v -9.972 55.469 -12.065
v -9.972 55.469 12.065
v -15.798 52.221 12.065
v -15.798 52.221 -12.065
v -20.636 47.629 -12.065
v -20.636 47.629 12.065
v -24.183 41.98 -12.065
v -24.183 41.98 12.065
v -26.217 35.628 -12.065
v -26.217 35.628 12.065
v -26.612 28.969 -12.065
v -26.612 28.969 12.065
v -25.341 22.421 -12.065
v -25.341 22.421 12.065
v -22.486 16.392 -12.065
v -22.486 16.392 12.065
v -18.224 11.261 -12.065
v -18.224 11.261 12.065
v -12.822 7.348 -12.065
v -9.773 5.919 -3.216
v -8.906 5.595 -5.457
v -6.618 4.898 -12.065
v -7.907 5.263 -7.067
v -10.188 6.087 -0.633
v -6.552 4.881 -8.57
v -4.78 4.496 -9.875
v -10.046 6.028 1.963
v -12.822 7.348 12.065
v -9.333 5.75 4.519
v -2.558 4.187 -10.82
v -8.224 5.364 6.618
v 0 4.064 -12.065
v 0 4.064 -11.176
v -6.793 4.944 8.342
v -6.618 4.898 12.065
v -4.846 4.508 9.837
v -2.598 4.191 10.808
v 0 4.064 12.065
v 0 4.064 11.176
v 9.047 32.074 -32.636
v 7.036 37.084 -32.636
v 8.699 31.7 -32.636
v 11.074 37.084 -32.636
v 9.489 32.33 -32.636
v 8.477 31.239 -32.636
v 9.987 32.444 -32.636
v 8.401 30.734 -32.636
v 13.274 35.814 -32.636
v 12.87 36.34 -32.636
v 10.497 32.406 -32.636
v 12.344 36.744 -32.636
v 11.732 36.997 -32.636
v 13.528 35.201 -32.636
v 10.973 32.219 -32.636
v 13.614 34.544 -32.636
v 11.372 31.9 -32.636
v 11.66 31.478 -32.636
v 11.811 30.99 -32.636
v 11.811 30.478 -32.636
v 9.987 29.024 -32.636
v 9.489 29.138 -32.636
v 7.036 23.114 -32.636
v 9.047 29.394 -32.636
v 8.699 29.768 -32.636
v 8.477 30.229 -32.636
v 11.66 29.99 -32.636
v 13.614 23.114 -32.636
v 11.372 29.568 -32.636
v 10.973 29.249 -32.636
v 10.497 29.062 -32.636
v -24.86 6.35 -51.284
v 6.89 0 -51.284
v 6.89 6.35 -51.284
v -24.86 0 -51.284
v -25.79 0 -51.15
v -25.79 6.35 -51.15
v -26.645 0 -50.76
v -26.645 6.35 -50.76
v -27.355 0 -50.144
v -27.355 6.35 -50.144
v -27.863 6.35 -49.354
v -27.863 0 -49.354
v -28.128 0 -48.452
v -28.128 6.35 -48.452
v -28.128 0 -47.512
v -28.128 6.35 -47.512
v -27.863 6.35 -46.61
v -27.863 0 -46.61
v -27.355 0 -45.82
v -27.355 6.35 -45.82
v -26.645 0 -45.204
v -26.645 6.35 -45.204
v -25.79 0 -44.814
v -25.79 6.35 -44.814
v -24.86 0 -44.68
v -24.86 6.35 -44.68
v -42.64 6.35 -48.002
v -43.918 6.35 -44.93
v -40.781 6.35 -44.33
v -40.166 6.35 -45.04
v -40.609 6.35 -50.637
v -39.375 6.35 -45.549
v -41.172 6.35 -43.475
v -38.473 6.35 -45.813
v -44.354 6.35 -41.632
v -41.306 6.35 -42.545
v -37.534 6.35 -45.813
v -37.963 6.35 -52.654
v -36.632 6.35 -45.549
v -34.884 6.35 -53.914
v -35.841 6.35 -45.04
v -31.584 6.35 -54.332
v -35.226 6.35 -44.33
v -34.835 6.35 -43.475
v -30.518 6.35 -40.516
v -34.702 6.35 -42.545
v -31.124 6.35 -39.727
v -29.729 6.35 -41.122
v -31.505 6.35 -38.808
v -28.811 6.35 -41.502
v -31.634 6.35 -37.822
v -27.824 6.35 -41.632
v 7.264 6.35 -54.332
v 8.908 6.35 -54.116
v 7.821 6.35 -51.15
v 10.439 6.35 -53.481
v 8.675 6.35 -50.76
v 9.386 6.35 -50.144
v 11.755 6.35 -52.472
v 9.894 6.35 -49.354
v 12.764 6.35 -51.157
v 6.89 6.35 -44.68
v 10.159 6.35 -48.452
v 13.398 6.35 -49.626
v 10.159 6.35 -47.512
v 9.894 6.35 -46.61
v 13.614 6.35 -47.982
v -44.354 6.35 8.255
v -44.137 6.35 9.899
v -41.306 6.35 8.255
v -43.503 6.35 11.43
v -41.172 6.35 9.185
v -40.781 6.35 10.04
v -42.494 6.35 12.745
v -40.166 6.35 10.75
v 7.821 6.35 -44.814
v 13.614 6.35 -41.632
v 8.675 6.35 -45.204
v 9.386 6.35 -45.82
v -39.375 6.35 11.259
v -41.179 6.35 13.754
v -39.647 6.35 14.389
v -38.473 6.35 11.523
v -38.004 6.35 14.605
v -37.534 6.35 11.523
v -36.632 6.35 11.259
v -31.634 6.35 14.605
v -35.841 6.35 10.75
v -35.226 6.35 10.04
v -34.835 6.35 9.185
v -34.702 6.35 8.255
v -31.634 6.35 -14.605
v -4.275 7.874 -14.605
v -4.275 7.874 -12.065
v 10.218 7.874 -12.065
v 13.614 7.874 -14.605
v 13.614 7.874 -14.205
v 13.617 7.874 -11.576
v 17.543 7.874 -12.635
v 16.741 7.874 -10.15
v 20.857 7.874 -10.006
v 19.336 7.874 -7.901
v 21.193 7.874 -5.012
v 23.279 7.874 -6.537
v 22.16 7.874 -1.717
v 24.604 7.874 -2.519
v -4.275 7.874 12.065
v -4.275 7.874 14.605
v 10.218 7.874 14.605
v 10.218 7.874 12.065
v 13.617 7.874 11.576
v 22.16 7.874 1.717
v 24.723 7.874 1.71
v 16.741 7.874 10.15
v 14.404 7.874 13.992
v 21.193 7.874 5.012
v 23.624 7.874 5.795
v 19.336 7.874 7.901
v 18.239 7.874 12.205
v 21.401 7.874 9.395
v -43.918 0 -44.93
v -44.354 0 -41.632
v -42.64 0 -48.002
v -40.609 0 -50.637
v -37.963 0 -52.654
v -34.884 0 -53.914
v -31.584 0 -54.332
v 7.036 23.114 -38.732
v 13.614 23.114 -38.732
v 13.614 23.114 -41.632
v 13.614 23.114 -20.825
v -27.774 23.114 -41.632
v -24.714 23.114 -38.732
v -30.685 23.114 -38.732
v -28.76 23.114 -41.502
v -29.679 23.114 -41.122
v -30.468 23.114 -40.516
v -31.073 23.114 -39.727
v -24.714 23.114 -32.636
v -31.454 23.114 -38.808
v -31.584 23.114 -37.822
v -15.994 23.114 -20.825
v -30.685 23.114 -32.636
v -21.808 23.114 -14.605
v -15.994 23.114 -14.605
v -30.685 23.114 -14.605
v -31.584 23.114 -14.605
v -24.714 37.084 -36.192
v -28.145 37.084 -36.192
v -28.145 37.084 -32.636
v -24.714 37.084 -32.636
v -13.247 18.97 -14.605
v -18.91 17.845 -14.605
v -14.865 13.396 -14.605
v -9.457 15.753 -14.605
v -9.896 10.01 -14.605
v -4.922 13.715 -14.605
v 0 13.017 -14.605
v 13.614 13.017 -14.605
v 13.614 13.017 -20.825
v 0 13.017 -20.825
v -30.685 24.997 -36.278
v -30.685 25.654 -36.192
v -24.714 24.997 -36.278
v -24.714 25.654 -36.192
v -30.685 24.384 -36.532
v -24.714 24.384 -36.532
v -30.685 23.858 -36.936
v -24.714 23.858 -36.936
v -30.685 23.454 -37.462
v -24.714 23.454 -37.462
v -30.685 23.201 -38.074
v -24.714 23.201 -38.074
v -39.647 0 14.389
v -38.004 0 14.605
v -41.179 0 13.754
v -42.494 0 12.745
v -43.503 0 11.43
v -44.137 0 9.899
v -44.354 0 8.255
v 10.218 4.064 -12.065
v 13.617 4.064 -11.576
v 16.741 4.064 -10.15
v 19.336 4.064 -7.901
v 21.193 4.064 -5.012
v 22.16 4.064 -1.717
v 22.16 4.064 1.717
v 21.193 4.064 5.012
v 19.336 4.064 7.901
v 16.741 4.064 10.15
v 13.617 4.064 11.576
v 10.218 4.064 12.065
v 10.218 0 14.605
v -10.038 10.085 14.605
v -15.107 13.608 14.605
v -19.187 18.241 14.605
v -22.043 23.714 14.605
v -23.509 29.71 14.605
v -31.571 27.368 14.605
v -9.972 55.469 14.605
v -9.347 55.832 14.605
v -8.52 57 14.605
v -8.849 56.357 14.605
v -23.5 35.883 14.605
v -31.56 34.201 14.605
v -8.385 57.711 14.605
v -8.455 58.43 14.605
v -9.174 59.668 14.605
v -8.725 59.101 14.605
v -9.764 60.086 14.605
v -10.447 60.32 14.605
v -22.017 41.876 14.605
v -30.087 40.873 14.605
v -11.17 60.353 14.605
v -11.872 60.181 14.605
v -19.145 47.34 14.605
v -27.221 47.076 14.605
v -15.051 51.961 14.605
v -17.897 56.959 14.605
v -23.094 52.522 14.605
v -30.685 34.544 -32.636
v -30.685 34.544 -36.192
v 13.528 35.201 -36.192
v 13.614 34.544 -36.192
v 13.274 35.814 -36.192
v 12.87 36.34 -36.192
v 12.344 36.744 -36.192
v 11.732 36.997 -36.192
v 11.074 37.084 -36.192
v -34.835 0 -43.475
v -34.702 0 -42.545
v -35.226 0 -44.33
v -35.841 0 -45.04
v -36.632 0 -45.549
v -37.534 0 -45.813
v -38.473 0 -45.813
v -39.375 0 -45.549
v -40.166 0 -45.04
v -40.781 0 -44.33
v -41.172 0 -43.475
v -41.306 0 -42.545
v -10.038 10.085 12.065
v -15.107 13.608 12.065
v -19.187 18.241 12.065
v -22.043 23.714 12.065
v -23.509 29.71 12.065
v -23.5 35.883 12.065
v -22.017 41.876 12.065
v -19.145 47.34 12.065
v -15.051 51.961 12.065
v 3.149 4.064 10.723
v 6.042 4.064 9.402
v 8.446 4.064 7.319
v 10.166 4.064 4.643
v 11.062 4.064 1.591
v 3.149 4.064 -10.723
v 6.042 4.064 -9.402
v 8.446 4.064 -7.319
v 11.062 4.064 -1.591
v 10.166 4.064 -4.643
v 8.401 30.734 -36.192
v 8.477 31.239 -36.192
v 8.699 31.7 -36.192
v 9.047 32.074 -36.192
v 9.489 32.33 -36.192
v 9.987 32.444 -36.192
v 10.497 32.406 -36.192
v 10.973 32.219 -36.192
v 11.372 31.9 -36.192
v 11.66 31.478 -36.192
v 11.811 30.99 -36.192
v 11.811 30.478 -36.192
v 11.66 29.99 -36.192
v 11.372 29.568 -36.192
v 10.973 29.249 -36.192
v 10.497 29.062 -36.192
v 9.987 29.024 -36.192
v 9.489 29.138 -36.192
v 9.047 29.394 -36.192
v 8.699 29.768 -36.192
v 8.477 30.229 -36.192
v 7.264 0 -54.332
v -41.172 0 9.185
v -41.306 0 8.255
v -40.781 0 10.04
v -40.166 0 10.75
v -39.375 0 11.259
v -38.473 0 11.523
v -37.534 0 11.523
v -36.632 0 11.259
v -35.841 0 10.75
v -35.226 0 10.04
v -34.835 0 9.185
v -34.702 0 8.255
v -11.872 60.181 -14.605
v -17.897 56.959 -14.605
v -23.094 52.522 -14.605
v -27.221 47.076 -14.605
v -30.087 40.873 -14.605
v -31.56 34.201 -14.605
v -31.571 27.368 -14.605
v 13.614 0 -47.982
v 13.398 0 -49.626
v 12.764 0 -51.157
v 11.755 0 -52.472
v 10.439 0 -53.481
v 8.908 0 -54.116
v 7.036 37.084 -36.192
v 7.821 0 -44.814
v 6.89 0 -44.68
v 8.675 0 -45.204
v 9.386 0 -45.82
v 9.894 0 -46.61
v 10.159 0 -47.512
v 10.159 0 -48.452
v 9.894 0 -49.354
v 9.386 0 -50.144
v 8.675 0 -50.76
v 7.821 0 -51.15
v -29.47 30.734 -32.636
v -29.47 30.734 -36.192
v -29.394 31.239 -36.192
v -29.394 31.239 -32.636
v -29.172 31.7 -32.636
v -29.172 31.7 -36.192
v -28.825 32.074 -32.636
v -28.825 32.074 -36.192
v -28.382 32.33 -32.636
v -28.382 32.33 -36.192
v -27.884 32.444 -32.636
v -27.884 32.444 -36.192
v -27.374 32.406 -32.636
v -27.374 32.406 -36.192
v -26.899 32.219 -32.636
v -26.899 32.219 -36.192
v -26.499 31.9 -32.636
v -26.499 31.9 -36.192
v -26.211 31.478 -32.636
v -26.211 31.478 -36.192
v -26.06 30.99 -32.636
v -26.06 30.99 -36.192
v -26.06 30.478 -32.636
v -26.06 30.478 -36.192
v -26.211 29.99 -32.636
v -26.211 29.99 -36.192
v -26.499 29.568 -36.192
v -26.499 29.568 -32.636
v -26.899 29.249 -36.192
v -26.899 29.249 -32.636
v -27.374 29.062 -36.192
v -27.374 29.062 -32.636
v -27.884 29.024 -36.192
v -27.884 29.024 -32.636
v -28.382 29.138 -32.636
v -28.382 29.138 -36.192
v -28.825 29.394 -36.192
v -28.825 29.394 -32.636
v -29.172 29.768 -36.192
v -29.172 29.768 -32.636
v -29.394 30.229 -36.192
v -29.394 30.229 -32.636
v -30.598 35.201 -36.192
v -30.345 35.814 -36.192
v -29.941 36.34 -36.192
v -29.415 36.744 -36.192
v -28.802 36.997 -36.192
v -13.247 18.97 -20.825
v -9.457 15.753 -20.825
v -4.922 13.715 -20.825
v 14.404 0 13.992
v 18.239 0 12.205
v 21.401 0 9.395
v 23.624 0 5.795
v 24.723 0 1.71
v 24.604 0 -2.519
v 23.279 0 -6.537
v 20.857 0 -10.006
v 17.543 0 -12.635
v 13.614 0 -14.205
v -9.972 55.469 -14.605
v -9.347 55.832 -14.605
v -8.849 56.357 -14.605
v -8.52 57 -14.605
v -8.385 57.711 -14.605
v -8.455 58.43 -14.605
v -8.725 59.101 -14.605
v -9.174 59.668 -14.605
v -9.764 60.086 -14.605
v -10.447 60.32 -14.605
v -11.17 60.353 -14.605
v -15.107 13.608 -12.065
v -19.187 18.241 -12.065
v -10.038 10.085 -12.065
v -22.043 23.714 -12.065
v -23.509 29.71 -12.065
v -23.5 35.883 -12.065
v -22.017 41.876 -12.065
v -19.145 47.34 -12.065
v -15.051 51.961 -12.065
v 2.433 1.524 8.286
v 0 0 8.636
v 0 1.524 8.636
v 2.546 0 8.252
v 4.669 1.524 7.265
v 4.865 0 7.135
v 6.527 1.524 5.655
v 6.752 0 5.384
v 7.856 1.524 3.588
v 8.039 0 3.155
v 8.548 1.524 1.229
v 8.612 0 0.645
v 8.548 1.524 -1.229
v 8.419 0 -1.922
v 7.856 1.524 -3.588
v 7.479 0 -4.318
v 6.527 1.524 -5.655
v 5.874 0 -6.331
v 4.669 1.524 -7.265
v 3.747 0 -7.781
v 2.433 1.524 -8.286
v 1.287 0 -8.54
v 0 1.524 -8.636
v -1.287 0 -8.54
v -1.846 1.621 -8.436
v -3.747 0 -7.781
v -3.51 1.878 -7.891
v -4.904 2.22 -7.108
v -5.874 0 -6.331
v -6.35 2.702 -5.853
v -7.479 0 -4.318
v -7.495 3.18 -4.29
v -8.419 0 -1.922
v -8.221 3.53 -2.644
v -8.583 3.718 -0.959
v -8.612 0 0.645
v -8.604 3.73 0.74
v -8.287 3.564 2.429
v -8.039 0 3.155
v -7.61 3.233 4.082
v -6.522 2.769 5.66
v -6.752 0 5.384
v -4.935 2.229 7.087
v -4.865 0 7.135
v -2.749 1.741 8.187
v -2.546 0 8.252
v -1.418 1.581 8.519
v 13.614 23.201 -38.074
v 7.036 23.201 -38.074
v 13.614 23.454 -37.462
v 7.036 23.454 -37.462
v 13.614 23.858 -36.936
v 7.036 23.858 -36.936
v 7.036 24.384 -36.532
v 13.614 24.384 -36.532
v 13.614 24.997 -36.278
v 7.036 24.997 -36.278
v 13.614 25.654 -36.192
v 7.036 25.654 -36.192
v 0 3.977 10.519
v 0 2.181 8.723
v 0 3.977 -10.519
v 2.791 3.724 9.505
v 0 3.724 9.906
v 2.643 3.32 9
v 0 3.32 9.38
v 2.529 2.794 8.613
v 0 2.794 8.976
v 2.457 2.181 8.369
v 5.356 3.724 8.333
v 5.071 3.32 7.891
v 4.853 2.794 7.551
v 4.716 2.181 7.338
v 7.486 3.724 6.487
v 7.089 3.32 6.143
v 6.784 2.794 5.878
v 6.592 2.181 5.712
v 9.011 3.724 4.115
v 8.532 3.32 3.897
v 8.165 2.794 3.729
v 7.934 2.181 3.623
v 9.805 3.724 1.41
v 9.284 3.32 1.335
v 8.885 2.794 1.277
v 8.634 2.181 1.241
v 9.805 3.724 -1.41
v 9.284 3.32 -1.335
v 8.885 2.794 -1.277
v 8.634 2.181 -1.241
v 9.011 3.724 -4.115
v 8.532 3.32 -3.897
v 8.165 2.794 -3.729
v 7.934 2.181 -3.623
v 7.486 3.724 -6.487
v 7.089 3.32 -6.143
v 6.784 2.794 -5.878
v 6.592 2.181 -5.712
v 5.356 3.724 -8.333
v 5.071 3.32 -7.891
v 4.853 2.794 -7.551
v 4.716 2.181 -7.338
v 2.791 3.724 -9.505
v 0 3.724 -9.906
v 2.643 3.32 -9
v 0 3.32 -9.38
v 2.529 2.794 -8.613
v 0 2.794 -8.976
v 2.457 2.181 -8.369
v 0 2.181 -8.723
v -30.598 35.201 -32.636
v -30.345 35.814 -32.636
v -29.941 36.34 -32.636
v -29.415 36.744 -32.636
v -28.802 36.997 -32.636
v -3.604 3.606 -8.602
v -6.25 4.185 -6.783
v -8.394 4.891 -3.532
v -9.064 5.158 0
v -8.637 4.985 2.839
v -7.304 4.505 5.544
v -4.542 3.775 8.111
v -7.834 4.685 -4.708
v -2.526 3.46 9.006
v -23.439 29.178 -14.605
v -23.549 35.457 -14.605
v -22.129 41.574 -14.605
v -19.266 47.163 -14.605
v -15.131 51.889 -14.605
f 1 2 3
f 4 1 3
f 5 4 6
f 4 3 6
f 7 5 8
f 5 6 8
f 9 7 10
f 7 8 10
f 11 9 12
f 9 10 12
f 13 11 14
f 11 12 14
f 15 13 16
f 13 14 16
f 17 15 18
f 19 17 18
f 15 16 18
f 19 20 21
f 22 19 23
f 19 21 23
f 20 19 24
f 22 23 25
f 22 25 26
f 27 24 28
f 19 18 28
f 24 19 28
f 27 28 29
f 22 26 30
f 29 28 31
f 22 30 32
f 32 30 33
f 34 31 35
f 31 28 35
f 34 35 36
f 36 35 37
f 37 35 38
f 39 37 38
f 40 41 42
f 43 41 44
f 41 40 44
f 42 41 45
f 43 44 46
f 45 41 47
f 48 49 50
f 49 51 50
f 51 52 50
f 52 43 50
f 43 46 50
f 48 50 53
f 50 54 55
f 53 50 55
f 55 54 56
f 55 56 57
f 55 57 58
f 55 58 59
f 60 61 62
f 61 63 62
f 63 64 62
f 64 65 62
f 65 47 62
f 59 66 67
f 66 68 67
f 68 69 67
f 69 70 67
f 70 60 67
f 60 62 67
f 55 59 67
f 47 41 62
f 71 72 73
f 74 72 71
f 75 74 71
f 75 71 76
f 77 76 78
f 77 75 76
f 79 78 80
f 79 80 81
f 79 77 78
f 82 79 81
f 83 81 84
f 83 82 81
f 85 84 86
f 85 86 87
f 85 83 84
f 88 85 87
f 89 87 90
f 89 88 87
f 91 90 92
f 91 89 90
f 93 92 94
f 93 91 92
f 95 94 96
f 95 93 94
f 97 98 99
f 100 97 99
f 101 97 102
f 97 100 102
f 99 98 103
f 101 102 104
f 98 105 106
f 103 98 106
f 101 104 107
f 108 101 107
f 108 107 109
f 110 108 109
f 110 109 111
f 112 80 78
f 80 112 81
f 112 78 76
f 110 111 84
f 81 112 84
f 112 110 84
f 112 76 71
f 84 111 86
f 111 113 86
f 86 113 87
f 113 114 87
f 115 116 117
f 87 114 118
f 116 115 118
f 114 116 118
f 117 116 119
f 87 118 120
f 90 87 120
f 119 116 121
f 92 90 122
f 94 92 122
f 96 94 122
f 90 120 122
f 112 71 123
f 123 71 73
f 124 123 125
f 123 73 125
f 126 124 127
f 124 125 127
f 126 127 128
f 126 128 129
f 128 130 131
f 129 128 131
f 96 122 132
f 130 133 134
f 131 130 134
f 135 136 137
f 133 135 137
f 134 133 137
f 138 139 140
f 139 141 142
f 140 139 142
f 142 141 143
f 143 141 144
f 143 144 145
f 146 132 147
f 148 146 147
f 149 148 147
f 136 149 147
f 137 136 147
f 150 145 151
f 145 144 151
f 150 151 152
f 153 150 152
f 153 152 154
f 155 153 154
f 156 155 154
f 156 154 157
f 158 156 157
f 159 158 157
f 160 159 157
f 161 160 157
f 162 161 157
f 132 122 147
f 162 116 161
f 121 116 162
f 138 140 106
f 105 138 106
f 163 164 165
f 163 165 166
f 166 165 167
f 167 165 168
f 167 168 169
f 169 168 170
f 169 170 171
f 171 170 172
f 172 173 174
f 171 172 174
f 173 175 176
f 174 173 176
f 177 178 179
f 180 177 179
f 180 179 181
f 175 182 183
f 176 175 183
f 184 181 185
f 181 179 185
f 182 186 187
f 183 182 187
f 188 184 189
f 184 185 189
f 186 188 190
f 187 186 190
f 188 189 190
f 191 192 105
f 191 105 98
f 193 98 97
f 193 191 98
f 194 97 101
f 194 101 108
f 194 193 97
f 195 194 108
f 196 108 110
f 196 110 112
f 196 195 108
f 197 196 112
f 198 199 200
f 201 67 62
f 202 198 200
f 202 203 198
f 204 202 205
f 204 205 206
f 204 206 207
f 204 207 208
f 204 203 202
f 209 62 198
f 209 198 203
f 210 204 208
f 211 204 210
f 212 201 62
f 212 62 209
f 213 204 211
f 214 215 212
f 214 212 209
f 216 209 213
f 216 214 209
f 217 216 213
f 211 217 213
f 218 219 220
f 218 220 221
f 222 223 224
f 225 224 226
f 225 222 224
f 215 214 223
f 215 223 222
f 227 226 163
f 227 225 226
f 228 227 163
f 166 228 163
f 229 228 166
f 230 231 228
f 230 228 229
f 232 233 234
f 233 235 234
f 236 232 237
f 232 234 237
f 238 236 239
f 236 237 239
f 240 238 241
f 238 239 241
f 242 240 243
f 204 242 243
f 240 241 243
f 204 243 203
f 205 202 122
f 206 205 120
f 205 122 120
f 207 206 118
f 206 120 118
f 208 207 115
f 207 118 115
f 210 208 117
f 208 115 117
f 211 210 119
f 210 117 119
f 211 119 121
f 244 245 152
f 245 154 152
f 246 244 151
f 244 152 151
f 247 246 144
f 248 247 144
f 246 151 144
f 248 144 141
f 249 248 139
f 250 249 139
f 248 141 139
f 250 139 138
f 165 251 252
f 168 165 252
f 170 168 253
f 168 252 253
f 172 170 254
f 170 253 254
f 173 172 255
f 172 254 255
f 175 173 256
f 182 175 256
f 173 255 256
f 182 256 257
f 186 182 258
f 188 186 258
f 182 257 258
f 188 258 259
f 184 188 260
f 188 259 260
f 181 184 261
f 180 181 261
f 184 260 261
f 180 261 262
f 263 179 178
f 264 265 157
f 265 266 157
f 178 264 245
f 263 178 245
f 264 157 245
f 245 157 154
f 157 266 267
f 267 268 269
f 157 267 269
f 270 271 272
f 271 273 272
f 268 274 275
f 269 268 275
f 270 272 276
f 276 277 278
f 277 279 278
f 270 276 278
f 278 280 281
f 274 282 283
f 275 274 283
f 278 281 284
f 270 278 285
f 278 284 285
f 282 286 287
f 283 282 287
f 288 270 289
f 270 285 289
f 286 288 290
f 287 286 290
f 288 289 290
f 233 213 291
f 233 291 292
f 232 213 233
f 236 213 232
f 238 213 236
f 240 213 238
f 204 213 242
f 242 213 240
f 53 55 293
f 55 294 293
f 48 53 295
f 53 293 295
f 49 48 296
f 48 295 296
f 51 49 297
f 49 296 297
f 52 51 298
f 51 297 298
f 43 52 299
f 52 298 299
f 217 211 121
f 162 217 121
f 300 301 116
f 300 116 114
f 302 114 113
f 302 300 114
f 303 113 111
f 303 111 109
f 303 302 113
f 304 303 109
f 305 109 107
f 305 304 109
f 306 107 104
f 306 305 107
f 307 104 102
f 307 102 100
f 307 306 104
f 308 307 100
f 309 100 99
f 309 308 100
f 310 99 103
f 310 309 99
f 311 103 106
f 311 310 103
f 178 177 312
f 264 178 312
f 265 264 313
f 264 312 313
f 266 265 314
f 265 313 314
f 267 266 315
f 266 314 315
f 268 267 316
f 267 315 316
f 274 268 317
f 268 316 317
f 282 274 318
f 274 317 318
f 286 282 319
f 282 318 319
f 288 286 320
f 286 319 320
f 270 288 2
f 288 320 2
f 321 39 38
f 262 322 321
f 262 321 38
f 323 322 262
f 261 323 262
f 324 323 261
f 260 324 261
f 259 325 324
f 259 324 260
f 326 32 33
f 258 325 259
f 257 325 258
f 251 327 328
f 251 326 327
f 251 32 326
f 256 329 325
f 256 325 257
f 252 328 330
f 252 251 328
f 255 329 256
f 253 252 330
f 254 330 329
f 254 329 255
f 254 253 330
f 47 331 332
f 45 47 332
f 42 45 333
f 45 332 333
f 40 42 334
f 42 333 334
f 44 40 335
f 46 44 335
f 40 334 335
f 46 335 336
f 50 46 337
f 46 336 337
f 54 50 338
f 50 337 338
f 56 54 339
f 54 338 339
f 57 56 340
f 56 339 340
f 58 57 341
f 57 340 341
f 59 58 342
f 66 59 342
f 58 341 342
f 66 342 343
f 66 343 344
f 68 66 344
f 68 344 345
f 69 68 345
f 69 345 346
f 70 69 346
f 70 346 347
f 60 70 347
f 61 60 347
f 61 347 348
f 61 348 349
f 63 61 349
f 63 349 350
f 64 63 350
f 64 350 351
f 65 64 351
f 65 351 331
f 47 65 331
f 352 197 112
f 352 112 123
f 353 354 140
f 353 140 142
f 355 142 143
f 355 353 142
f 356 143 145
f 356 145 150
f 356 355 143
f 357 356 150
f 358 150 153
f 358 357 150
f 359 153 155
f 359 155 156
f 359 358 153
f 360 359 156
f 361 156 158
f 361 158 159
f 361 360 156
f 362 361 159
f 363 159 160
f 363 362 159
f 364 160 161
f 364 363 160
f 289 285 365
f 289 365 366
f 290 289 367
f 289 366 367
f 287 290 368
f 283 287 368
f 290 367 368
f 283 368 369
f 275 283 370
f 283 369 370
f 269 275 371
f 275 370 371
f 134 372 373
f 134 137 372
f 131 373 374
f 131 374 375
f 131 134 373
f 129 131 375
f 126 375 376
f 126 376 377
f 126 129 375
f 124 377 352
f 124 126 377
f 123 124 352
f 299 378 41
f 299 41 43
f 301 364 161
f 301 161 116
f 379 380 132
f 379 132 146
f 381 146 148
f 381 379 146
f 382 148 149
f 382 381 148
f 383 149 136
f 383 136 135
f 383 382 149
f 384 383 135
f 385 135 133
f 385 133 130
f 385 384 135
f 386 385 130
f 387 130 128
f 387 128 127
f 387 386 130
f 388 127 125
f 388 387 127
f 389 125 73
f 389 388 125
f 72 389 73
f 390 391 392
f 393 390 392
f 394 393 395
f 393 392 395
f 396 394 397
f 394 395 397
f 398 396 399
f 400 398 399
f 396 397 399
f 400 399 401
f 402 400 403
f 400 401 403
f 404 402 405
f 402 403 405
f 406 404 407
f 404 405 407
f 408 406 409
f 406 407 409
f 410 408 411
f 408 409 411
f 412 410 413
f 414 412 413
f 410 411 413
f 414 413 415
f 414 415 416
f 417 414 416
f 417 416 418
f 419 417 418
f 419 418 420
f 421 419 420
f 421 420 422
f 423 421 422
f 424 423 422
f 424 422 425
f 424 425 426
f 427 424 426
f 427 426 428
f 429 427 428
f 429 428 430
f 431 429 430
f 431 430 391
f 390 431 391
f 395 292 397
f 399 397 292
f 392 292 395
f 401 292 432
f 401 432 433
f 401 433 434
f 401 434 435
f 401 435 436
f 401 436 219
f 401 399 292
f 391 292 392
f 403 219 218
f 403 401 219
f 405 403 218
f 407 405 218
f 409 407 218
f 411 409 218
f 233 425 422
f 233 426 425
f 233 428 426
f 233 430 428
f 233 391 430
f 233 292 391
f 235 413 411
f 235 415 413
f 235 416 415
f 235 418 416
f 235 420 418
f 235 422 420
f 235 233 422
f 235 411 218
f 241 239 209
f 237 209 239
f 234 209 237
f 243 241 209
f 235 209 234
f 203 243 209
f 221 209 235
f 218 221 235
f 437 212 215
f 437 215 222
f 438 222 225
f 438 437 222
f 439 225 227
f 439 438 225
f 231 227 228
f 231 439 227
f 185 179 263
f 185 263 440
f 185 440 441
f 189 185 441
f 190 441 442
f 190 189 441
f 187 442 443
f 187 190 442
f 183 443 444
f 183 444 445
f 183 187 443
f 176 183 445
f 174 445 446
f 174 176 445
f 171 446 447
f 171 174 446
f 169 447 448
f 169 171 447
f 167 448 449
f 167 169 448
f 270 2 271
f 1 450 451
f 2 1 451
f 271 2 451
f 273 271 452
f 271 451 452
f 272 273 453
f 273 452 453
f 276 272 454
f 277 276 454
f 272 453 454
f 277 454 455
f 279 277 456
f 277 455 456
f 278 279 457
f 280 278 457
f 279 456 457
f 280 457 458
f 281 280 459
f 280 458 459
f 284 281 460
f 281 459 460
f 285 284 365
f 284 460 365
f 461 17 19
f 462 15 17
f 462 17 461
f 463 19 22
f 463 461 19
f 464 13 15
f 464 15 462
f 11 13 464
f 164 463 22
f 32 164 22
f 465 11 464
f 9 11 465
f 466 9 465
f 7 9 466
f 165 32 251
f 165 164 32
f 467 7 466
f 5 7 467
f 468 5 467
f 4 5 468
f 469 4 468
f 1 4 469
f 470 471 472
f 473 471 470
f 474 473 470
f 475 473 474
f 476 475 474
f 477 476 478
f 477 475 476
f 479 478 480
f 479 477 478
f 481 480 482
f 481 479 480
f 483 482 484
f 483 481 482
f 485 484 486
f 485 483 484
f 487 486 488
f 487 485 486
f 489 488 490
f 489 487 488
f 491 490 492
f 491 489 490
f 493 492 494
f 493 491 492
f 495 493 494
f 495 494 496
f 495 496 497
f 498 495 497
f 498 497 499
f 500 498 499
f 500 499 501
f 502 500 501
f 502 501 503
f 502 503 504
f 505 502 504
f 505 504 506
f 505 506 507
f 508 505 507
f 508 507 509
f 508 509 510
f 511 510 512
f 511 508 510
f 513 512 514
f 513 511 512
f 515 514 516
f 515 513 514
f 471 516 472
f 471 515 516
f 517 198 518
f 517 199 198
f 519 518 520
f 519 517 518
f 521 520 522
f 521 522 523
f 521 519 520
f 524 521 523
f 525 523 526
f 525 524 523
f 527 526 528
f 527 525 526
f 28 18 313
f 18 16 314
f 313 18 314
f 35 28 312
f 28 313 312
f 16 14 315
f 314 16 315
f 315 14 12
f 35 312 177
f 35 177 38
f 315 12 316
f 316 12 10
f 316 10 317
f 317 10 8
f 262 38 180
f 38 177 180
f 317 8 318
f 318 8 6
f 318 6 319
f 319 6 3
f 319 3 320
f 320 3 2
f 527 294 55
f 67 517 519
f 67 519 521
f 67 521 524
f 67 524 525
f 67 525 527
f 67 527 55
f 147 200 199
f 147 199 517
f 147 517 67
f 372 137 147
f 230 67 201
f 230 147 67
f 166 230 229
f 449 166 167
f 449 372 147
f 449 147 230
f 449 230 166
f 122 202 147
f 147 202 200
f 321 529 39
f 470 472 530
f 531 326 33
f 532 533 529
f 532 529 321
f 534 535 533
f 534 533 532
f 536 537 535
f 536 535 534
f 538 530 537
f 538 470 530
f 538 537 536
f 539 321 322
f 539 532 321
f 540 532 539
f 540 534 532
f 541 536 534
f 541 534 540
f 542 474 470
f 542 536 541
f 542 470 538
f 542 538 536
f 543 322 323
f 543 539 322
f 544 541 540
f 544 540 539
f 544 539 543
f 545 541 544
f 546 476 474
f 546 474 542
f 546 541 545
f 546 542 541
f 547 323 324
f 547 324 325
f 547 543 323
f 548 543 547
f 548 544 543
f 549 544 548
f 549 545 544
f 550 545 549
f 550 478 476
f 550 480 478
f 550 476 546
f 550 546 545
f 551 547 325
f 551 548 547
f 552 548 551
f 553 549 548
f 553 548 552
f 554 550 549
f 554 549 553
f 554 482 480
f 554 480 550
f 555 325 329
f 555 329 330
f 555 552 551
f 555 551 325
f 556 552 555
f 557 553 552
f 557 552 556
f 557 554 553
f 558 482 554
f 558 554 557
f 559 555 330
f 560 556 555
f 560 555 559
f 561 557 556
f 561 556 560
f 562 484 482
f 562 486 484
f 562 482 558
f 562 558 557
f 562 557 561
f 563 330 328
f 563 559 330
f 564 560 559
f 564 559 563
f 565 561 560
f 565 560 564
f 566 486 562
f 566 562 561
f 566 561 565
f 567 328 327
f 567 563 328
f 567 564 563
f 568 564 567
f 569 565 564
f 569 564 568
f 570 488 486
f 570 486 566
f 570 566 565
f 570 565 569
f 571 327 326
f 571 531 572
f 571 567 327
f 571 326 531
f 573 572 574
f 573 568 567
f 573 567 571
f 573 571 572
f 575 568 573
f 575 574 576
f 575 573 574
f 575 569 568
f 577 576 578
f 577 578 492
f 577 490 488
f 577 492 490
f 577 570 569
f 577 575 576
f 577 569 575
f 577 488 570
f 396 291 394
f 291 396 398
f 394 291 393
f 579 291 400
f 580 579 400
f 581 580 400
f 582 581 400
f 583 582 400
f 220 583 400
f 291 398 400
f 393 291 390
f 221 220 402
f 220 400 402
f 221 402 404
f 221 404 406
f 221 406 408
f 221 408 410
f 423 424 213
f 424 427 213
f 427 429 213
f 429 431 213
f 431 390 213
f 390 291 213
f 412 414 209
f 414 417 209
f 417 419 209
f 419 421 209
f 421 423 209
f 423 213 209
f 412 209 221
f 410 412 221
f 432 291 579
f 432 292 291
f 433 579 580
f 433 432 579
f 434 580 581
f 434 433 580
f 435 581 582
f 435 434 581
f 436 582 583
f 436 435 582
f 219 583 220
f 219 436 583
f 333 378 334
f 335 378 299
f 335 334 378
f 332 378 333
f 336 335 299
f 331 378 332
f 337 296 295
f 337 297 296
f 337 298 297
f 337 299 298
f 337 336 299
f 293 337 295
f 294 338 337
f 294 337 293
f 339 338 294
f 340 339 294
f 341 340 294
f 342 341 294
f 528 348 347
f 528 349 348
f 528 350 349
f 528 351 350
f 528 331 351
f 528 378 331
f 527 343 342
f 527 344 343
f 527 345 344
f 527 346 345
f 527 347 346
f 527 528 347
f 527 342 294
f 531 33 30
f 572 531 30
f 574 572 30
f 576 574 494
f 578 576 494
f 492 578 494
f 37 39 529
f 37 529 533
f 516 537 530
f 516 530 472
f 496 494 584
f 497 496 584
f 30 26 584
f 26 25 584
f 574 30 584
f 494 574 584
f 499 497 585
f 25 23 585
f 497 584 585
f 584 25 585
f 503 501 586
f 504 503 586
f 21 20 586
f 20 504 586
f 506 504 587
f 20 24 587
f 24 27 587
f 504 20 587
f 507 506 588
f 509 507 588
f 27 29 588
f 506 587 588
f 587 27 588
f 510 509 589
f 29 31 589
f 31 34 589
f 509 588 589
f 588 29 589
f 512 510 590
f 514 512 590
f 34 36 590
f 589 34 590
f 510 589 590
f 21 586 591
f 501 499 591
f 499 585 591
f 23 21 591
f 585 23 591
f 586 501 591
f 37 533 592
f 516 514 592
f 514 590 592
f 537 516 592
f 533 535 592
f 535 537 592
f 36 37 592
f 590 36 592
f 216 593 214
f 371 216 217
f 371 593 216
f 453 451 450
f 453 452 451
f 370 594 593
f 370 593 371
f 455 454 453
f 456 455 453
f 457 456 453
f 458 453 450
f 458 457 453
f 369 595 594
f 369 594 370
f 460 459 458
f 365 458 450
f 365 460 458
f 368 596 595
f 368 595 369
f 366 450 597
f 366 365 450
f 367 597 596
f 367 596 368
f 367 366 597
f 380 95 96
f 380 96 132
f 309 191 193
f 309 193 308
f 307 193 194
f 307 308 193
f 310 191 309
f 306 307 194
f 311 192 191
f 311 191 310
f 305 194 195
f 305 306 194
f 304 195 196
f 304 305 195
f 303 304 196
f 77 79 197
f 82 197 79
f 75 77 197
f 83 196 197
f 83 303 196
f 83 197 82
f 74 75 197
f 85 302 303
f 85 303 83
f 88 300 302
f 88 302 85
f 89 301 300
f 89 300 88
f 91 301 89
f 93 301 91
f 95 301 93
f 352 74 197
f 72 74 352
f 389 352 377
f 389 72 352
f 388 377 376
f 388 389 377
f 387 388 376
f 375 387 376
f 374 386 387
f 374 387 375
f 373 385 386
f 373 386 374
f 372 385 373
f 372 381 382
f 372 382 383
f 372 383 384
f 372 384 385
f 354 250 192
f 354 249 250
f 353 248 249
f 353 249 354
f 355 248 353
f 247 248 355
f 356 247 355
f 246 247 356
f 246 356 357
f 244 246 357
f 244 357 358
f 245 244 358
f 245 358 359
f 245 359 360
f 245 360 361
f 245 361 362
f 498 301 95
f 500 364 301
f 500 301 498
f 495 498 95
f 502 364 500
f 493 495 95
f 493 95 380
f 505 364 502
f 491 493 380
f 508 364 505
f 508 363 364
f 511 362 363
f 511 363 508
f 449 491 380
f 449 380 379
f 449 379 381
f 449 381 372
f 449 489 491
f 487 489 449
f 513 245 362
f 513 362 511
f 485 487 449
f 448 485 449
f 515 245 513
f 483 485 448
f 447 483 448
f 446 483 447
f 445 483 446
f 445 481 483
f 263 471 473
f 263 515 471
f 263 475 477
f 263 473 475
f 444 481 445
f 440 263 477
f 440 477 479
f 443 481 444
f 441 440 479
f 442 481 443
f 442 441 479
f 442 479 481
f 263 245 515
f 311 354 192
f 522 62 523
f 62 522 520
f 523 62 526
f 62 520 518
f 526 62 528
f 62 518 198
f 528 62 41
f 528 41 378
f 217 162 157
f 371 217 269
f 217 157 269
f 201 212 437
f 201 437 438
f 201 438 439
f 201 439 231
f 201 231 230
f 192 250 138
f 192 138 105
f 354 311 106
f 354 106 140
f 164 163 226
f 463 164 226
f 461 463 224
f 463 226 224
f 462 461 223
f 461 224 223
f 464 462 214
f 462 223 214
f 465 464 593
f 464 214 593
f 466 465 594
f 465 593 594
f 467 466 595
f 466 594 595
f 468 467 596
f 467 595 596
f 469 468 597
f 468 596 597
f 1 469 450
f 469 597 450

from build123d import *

# Parameters (mm, degrees)
SKETCH1_W                       = 63.5
SKETCH1_H                       = 24.13
BOSS_EXTRUDE1_DEPTH             = 4.064
BOSS_EXTRUDE2_REACH             = 36.207
BOSS_EXTRUDE2_DIRECTION_2_REACH = 36.207
CUT_EXTRUDE1_DEPTH              = 4.064
CUT_EXTRUDE1_DEPTH_BACK         = 66.752974943
SKETCH4_R                       = 8.636
FILLET1_R                       = 2.54
CUT_EXTRUDE2_DEPTH              = 73.348315655
BOSS_EXTRUDE3_DEPTH             = 2.54
BOSS_EXTRUDE4_START             = 2.54
BOSS_EXTRUDE4_DEPTH             = 2.54
BOSS_EXTRUDE5_DEPTH             = 3.81
CUT_EXTRUDE3_DEPTH              = 64.061052508
BOSS_EXTRUDE6_START             = -23.114
SKETCH12_W                      = 44.831
SKETCH12_H                      = 27.027043781
BOSS_EXTRUDE6_DEPTH             = 23.114
BOSS_EXTRUDE7_DEPTH             = 7.874
CUT_EXTRUDE4_START              = -6.219751
CUT_EXTRUDE4_DEPTH              = 6.219751
CUT_EXTRUDE5_DEPTH              = 27.027043781
SKETCH17_W                      = 6.9977
SKETCH17_H                      = 3.556
BOSS_EXTRUDE8_DEPTH             = 13.97
SKETCH18_W                      = 6.389869694
SKETCH18_H                      = 3.556
BOSS_EXTRUDE9_DEPTH             = 13.97
SKETCH19_W                      = 31.75
SKETCH19_H                      = 7.112
CUT_EXTRUDE6_DEPTH              = 13.97
CUT_EXTRUDE7_REACH              = 87.043
SKETCH20_R                      = 1.7145
FILLET2_R                       = 2.54
FILLET3_R                       = 2.54
FILLET4_R                       = 2.54
BOSS_EXTRUDE10_DEPTH            = 29.21
BOSS_EXTRUDE11_DEPTH            = 27.027043781
BOSS_EXTRUDE16_DEPTH            = 6.35
FILLET5_R                       = 6.35
FILLET6_R                       = 3.81


with BuildPart() as part:
    # Sketch1 → Boss-Extrude1 (new body)
    with BuildSketch(Plane(origin=(0, 0, 0), x_dir=(1, 0, 0), z_dir=(0, 1, 0))):
        Rectangle(SKETCH1_W, SKETCH1_H)
    extrude(amount=BOSS_EXTRUDE1_DEPTH)

    # Boss-Extrude2: up to this face of the body (flat: up to its plane)
    boss_extrude2_end = Plane(part.part.faces().sort_by_distance((0, 2.032, 12.065))[0])
    # Sketch2 → Boss-Extrude2 (add, up to the picked face)
    with BuildSketch(Plane.XY, mode=Mode.PRIVATE) as boss_extrude2_sk1:
        with BuildLine():
            Line((0, 4.064), (-26.716755185, 4.064))
            Line((-26.716755185, 4.064), (-31.571041118, 27.367716778))
            ThreePointArc((-31.571041118, 27.367716778), (-27.221246487, 47.076161415), (-11.87173913, 60.180974548))
            ThreePointArc((-11.87173913, 60.180974548), (-8.566242036, 58.774955714), (-9.97226087, 55.46945862))
            ThreePointArc((-9.97226087, 55.46945862), (-26.181898149, 25.654914521), (0, 4.064))
        make_face()
    boss_extrude2_tool1 = split(extrude(boss_extrude2_sk1.sketch, amount=BOSS_EXTRUDE2_REACH, mode=Mode.PRIVATE), bisect_by=boss_extrude2_end, keep=Keep.BOTH, mode=Mode.PRIVATE)
    add(boss_extrude2_tool1.solids().sort_by(Axis((-9.165723, 58.533271, 0), (0, 0, 1)))[0])

    # Boss-Extrude2 direction 2: up to this face of the body (flat: up to its plane)
    boss_extrude2_direction_2_end = Plane(part.part.faces().sort_by_distance((0, 2.032, -12.065))[0])
    # Sketch2 → Boss-Extrude2 direction 2 (add, up to the picked face)
    with BuildSketch(Plane.XY, mode=Mode.PRIVATE) as boss_extrude2_direction_2_sk1:
        with BuildLine():
            Line((0, 4.064), (-26.716755185, 4.064))
            Line((-26.716755185, 4.064), (-31.571041118, 27.367716778))
            ThreePointArc((-31.571041118, 27.367716778), (-27.221246487, 47.076161415), (-11.87173913, 60.180974548))
            ThreePointArc((-11.87173913, 60.180974548), (-8.566242036, 58.774955714), (-9.97226087, 55.46945862))
            ThreePointArc((-9.97226087, 55.46945862), (-26.181898149, 25.654914521), (0, 4.064))
        make_face()
    boss_extrude2_direction_2_tool1 = split(extrude(boss_extrude2_direction_2_sk1.sketch, amount=-BOSS_EXTRUDE2_DIRECTION_2_REACH, mode=Mode.PRIVATE), bisect_by=boss_extrude2_direction_2_end, keep=Keep.BOTH, mode=Mode.PRIVATE)
    add(boss_extrude2_direction_2_tool1.solids().sort_by(Axis((-9.165723, 58.533271, 0), (0, 0, -1)))[0])

    # Sketch4 → Cut-Extrude1 (cut, two sides: drawn at the far end of the back side and taken through both)
    with BuildSketch(Plane(origin=(0, 4.064, 0), x_dir=(1, 0, 0), z_dir=(0, 1, 0)).offset(-CUT_EXTRUDE1_DEPTH_BACK)):
        with Locations(Location((0, 0, 0), (0, 0, 270))):
            Circle(SKETCH4_R)
    extrude(amount=CUT_EXTRUDE1_DEPTH + CUT_EXTRUDE1_DEPTH_BACK, mode=Mode.SUBTRACT)

    # Fillet1
    fillet1_edges = [part.edges().sort_by_distance(p)[0] for p in [
        (-8.636, 5.50091846, 0),
        (8.636, 4.064, 0),
    ]]
    fillet(fillet1_edges, radius=FILLET1_R)

    # Sketch6 → Cut-Extrude2 (cut, through all)
    with BuildSketch(Plane.XY.offset(12.065)):
        Polygon((-31.75, 4.064), (-26.716755185, 4.064), (-25.870202757, 0), (-31.75, 0), align=None)
    extrude(amount=-CUT_EXTRUDE2_DEPTH, mode=Mode.SUBTRACT)

    # Sketch8 → Boss-Extrude3 (add)
    with BuildSketch(Plane.XY.offset(12.065)):
        with BuildLine():
            Line((31.75, 0), (31.75, 7.874))
            Line((31.75, 7.874), (-4.274632474, 7.874))
            ThreePointArc((-4.274632474, 7.874), (-23.508790492, 29.710248048), (-9.97226087, 55.46945862))
            ThreePointArc((-9.97226087, 55.46945862), (-8.566242036, 58.774955714), (-11.87173913, 60.180974548))
            ThreePointArc((-11.87173913, 60.180974548), (-27.221246487, 47.076161415), (-31.571041118, 27.367716778))
            Line((-31.571041118, 27.367716778), (-25.870202757, 0))
            Line((-25.870202757, 0), (31.75, 0))
        make_face()
    extrude(amount=BOSS_EXTRUDE3_DEPTH)

    # Sketch9 → Boss-Extrude4 (add)
    with BuildSketch(Plane(origin=(0, 0, -12.065), x_dir=(-1, 0, 0), z_dir=(0, 0, -1)).offset(BOSS_EXTRUDE4_START)):
        with BuildLine():
            Line((-31.75, 0), (-31.75, 7.874))
            Line((-31.75, 7.874), (4.274632474, 7.874))
            ThreePointArc((4.274632474, 7.874), (23.508790492, 29.710248048), (9.97226087, 55.46945862))
            ThreePointArc((9.97226087, 55.46945862), (8.566242036, 58.774955714), (11.87173913, 60.180974548))
            ThreePointArc((11.87173913, 60.180974548), (27.221246487, 47.076161415), (31.571041118, 27.367716778))
            Line((31.571041118, 27.367716778), (25.870202757, 0))
            Line((25.870202757, 0), (-31.75, 0))
        make_face()
    extrude(amount=-BOSS_EXTRUDE4_DEPTH)

    # Sketch10 → Boss-Extrude5 (add)
    with BuildSketch(Plane(origin=(0, 4.064, 0), x_dir=(1, 0, 0), z_dir=(0, 1, 0))):
        with BuildLine():
            Line((10.218295125, 14.605), (10.218295125, 12.065))
            ThreePointArc((10.218295125, 12.065), (22.283295125, 0), (10.218295125, -12.065))
            Line((10.218295125, -12.065), (10.218295125, -14.605))
            ThreePointArc((10.218295125, -14.605), (24.823295125, 0), (10.218295125, 14.605))
        make_face()
    extrude(amount=BOSS_EXTRUDE5_DEPTH)

    # Sketch11 → Cut-Extrude3 (cut, through all)
    with BuildSketch(Plane(origin=(0, 7.874, 0), x_dir=(1, 0, 0), z_dir=(0, 1, 0))):
        with BuildLine():
            Line((10.218295125, 14.605), (31.75, 14.605))
            Line((31.75, 14.605), (31.75, -14.605))
            Line((31.75, -14.605), (10.218295125, -14.605))
            ThreePointArc((10.218295125, -14.605), (24.823295125, 0), (10.218295125, 14.605))
        make_face()
    extrude(amount=-CUT_EXTRUDE3_DEPTH, mode=Mode.SUBTRACT)

    # Sketch12 → Boss-Extrude6 (add)
    with BuildSketch(Plane.XZ.offset(BOSS_EXTRUDE6_START)):
        with Locations((-8.8011, -28.11852189)):
            Rectangle(SKETCH12_W, SKETCH12_H)
    extrude(amount=BOSS_EXTRUDE6_DEPTH)

    # Sketch13 → Boss-Extrude7 (add)
    with BuildSketch(Plane.XZ):
        Polygon((10.218295125, -14.605), (13.6144, -14.605), (13.6144, -13.335525526), align=None)
    extrude(amount=-BOSS_EXTRUDE7_DEPTH)

    # Sketch14 → Cut-Extrude4 (cut)
    with BuildSketch(Plane.XY.offset(-14.605).offset(CUT_EXTRUDE4_START)):
        with BuildLine():
            Line((0, 13.017313502), (18.620278687, 13.017313502))
            Line((18.620278687, 13.017313502), (17.716686498, 30.734))
            ThreePointArc((17.716686498, 30.734), (-12.527589163, 43.261589163), (0, 13.017313502))
        make_face()
    extrude(amount=CUT_EXTRUDE4_DEPTH, mode=Mode.SUBTRACT)

    # Sketch16 → Cut-Extrude5 (cut)
    with BuildSketch(Plane.XY.offset(-14.605)):
        Polygon((-31.2166, 23.114), (-30.684969694, 23.114), (-25.870202757, 0), (-31.2166, 0), align=None)
    extrude(amount=-CUT_EXTRUDE5_DEPTH, mode=Mode.SUBTRACT)

    # Sketch17 → Boss-Extrude8 (add)
    with BuildSketch(Plane(origin=(0, 23.114, 0), x_dir=(1, 0, 0), z_dir=(0, 1, 0))):
        with Locations((10.11555, 34.413750632)):
            Rectangle(SKETCH17_W, SKETCH17_H)
    extrude(amount=BOSS_EXTRUDE8_DEPTH)

    # Sketch18 → Boss-Extrude9 (add)
    with BuildSketch(Plane(origin=(0, 23.114, 0), x_dir=(1, 0, 0), z_dir=(0, 1, 0))):
        with Locations((-27.490034847, 34.413750632)):
            Rectangle(SKETCH18_W, SKETCH18_H)
    extrude(amount=BOSS_EXTRUDE9_DEPTH)

    # Sketch19 → Cut-Extrude6 (cut)
    with BuildSketch(Plane(origin=(0, 37.084, 0), x_dir=(1, 0, 0), z_dir=(0, 1, 0))):
        with Locations((-8.8392, 36.191750632)):
            Rectangle(SKETCH19_W, SKETCH19_H)
    extrude(amount=-CUT_EXTRUDE6_DEPTH, mode=Mode.SUBTRACT)

    # Sketch20 → Cut-Extrude7 (cut, up to next)
    with BuildSketch(Plane(origin=(0, 0, -36.191750632), x_dir=(-1, 0, 0), z_dir=(0, 0, -1)), mode=Mode.PRIVATE) as cut_extrude7_sk1:
        with Locations((27.75585, 30.734)):
            Circle(SKETCH20_R)
    cut_extrude7_tool1 = extrude(cut_extrude7_sk1.sketch, amount=-CUT_EXTRUDE7_REACH, mode=Mode.PRIVATE) & part.part
    # Sketch20 → Cut-Extrude7 (cut, up to next)
    with BuildSketch(Plane(origin=(0, 0, -36.191750632), x_dir=(-1, 0, 0), z_dir=(0, 0, -1)), mode=Mode.PRIVATE) as cut_extrude7_sk2:
        with Locations((-10.11555, 30.734)):
            Circle(SKETCH20_R)
    cut_extrude7_tool2 = extrude(cut_extrude7_sk2.sketch, amount=-CUT_EXTRUDE7_REACH, mode=Mode.PRIVATE) & part.part
    add(cut_extrude7_tool1.solids().sort_by_distance((-27.75585, 30.734, -36.191751))[0], mode=Mode.SUBTRACT)
    add(cut_extrude7_tool2.solids().sort_by_distance((10.11555, 30.734, -36.191751))[0], mode=Mode.SUBTRACT)

    # Fillet2
    fillet2_edges = [part.edges().sort_by_distance(p)[0] for p in [
        (10.3251, 23.114, -36.191750632),
    ]]
    fillet(fillet2_edges, radius=FILLET2_R)

    # Fillet3
    fillet3_edges = [part.edges().sort_by_distance(p)[0] for p in [
        (-27.699584847, 23.114, -36.191750632),
    ]]
    fillet(fillet3_edges, radius=FILLET3_R)

    # Fillet4
    fillet4_edges = [part.edges().sort_by_distance(p)[0] for p in [
        (13.6144, 37.084, -34.413750632),
        (-30.684969694, 37.084, -34.413750632),
    ]]
    fillet(fillet4_edges, radius=FILLET4_R)

    # Sketch26 → Boss-Extrude10 (add)
    with BuildSketch(Plane.XY.offset(14.605)):
        Polygon((-25.870202757, 0), (-31.653563464, 0), (-31.571041118, 27.367716778), align=None)
    extrude(amount=-BOSS_EXTRUDE10_DEPTH)

    # Sketch22 → Boss-Extrude11 (add)
    with BuildSketch(Plane(origin=(0, 0, -14.605), x_dir=(-1, 0, 0), z_dir=(0, 0, -1))):
        Polygon((30.684969694, 23.114), (31.583867423, 23.114), (31.653563464, 0), (25.870202757, 0), align=None)
    extrude(amount=BOSS_EXTRUDE11_DEPTH)

    # Sketch23 → Boss-Extrude16 (add)
    with BuildSketch(Plane.XZ):
        with BuildLine():
            Line((-15.554631727, 14.605), (-44.353563464, 14.605))
            Line((-44.353563464, 14.605), (-44.353563464, -41.632043781))
            ThreePointArc((-44.353563464, -41.632043781), (-40.609144413, -50.636907459), (-31.583867423, -54.331852538))
            Line((-31.583867423, -54.331852538), (13.6144, -54.332043781))
            Line((13.6144, -54.332043781), (13.6144, -35.10352189))
            Line((13.6144, -35.10352189), (-15.554631727, -35.10352189))
            Line((-15.554631727, -35.10352189), (-15.554631727, 14.605))
        make_face()
        with BuildLine():
            Line((-34.701563464, 8.255), (-34.701563464, -42.545))
            ThreePointArc((-34.701563464, -42.545), (-38.003563464, -45.847), (-41.305563464, -42.545))
            Line((-41.305563464, -42.545), (-41.305563464, 8.255))
            ThreePointArc((-41.305563464, 8.255), (-38.003563464, 11.557), (-34.701563464, 8.255))
        make_face(mode=Mode.SUBTRACT)
        with BuildLine():
            Line((-24.859733712, -44.680043781), (6.890266288, -44.680043781))
            ThreePointArc((6.890266288, -44.680043781), (10.192266288, -47.982043781), (6.890266288, -51.284043781))
            Line((6.890266288, -51.284043781), (-24.859733712, -51.284043781))
            ThreePointArc((-24.859733712, -51.284043781), (-28.161733712, -47.982043781), (-24.859733712, -44.680043781))
        make_face(mode=Mode.SUBTRACT)
    extrude(amount=-BOSS_EXTRUDE16_DEPTH)

    # Fillet5
    fillet5_edges = [part.edges().sort_by_distance(p)[0] for p in [
        (13.6144, 3.175, -54.332043781),
        (-44.353563464, 3.175, 14.605),
    ]]
    fillet(fillet5_edges, radius=FILLET5_R)

    # Fillet6
    fillet6_edges = [part.edges().sort_by_distance(p)[0] for p in [
        (-31.609141812, 14.732, -41.632043781),
    ]]
    fillet(fillet6_edges, radius=FILLET6_R)


solid = part.part
